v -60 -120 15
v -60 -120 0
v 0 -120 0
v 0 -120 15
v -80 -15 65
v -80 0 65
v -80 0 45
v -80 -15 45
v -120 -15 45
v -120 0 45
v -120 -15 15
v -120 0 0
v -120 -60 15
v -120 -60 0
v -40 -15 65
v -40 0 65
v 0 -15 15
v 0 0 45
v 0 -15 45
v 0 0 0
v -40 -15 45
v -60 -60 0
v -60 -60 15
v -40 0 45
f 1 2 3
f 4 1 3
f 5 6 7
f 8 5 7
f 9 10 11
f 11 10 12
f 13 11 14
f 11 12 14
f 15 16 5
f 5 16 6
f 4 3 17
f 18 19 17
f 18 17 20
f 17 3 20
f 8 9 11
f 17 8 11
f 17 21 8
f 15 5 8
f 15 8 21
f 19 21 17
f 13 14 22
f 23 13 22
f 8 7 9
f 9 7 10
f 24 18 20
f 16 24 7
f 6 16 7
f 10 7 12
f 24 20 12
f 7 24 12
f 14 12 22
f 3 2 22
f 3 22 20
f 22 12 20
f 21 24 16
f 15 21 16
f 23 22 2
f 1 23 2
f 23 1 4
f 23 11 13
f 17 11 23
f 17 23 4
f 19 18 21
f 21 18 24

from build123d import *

# Parameters (mm, degrees)
F1_DEPTH = 15
F3_DEPTH = 15


with BuildPart() as f1:
    # F0 (on Top) → F1 (new body)
    with BuildSketch(Plane.XY):
        Polygon((0, -120), (0, 0), (-120, 0), (-120, -60), (-60, -60), (-60, -120), align=None)
    extrude(amount=F1_DEPTH)

    # F2 (on Front) → F3 (join)
    with BuildSketch(Plane.XZ):
        Polygon((-120, 0), (0, 0), (0, 45), (-40, 45), (-40, 65), (-80, 65), (-80, 45), (-120, 45), align=None)
    extrude(amount=F3_DEPTH)


solid = f1.part
